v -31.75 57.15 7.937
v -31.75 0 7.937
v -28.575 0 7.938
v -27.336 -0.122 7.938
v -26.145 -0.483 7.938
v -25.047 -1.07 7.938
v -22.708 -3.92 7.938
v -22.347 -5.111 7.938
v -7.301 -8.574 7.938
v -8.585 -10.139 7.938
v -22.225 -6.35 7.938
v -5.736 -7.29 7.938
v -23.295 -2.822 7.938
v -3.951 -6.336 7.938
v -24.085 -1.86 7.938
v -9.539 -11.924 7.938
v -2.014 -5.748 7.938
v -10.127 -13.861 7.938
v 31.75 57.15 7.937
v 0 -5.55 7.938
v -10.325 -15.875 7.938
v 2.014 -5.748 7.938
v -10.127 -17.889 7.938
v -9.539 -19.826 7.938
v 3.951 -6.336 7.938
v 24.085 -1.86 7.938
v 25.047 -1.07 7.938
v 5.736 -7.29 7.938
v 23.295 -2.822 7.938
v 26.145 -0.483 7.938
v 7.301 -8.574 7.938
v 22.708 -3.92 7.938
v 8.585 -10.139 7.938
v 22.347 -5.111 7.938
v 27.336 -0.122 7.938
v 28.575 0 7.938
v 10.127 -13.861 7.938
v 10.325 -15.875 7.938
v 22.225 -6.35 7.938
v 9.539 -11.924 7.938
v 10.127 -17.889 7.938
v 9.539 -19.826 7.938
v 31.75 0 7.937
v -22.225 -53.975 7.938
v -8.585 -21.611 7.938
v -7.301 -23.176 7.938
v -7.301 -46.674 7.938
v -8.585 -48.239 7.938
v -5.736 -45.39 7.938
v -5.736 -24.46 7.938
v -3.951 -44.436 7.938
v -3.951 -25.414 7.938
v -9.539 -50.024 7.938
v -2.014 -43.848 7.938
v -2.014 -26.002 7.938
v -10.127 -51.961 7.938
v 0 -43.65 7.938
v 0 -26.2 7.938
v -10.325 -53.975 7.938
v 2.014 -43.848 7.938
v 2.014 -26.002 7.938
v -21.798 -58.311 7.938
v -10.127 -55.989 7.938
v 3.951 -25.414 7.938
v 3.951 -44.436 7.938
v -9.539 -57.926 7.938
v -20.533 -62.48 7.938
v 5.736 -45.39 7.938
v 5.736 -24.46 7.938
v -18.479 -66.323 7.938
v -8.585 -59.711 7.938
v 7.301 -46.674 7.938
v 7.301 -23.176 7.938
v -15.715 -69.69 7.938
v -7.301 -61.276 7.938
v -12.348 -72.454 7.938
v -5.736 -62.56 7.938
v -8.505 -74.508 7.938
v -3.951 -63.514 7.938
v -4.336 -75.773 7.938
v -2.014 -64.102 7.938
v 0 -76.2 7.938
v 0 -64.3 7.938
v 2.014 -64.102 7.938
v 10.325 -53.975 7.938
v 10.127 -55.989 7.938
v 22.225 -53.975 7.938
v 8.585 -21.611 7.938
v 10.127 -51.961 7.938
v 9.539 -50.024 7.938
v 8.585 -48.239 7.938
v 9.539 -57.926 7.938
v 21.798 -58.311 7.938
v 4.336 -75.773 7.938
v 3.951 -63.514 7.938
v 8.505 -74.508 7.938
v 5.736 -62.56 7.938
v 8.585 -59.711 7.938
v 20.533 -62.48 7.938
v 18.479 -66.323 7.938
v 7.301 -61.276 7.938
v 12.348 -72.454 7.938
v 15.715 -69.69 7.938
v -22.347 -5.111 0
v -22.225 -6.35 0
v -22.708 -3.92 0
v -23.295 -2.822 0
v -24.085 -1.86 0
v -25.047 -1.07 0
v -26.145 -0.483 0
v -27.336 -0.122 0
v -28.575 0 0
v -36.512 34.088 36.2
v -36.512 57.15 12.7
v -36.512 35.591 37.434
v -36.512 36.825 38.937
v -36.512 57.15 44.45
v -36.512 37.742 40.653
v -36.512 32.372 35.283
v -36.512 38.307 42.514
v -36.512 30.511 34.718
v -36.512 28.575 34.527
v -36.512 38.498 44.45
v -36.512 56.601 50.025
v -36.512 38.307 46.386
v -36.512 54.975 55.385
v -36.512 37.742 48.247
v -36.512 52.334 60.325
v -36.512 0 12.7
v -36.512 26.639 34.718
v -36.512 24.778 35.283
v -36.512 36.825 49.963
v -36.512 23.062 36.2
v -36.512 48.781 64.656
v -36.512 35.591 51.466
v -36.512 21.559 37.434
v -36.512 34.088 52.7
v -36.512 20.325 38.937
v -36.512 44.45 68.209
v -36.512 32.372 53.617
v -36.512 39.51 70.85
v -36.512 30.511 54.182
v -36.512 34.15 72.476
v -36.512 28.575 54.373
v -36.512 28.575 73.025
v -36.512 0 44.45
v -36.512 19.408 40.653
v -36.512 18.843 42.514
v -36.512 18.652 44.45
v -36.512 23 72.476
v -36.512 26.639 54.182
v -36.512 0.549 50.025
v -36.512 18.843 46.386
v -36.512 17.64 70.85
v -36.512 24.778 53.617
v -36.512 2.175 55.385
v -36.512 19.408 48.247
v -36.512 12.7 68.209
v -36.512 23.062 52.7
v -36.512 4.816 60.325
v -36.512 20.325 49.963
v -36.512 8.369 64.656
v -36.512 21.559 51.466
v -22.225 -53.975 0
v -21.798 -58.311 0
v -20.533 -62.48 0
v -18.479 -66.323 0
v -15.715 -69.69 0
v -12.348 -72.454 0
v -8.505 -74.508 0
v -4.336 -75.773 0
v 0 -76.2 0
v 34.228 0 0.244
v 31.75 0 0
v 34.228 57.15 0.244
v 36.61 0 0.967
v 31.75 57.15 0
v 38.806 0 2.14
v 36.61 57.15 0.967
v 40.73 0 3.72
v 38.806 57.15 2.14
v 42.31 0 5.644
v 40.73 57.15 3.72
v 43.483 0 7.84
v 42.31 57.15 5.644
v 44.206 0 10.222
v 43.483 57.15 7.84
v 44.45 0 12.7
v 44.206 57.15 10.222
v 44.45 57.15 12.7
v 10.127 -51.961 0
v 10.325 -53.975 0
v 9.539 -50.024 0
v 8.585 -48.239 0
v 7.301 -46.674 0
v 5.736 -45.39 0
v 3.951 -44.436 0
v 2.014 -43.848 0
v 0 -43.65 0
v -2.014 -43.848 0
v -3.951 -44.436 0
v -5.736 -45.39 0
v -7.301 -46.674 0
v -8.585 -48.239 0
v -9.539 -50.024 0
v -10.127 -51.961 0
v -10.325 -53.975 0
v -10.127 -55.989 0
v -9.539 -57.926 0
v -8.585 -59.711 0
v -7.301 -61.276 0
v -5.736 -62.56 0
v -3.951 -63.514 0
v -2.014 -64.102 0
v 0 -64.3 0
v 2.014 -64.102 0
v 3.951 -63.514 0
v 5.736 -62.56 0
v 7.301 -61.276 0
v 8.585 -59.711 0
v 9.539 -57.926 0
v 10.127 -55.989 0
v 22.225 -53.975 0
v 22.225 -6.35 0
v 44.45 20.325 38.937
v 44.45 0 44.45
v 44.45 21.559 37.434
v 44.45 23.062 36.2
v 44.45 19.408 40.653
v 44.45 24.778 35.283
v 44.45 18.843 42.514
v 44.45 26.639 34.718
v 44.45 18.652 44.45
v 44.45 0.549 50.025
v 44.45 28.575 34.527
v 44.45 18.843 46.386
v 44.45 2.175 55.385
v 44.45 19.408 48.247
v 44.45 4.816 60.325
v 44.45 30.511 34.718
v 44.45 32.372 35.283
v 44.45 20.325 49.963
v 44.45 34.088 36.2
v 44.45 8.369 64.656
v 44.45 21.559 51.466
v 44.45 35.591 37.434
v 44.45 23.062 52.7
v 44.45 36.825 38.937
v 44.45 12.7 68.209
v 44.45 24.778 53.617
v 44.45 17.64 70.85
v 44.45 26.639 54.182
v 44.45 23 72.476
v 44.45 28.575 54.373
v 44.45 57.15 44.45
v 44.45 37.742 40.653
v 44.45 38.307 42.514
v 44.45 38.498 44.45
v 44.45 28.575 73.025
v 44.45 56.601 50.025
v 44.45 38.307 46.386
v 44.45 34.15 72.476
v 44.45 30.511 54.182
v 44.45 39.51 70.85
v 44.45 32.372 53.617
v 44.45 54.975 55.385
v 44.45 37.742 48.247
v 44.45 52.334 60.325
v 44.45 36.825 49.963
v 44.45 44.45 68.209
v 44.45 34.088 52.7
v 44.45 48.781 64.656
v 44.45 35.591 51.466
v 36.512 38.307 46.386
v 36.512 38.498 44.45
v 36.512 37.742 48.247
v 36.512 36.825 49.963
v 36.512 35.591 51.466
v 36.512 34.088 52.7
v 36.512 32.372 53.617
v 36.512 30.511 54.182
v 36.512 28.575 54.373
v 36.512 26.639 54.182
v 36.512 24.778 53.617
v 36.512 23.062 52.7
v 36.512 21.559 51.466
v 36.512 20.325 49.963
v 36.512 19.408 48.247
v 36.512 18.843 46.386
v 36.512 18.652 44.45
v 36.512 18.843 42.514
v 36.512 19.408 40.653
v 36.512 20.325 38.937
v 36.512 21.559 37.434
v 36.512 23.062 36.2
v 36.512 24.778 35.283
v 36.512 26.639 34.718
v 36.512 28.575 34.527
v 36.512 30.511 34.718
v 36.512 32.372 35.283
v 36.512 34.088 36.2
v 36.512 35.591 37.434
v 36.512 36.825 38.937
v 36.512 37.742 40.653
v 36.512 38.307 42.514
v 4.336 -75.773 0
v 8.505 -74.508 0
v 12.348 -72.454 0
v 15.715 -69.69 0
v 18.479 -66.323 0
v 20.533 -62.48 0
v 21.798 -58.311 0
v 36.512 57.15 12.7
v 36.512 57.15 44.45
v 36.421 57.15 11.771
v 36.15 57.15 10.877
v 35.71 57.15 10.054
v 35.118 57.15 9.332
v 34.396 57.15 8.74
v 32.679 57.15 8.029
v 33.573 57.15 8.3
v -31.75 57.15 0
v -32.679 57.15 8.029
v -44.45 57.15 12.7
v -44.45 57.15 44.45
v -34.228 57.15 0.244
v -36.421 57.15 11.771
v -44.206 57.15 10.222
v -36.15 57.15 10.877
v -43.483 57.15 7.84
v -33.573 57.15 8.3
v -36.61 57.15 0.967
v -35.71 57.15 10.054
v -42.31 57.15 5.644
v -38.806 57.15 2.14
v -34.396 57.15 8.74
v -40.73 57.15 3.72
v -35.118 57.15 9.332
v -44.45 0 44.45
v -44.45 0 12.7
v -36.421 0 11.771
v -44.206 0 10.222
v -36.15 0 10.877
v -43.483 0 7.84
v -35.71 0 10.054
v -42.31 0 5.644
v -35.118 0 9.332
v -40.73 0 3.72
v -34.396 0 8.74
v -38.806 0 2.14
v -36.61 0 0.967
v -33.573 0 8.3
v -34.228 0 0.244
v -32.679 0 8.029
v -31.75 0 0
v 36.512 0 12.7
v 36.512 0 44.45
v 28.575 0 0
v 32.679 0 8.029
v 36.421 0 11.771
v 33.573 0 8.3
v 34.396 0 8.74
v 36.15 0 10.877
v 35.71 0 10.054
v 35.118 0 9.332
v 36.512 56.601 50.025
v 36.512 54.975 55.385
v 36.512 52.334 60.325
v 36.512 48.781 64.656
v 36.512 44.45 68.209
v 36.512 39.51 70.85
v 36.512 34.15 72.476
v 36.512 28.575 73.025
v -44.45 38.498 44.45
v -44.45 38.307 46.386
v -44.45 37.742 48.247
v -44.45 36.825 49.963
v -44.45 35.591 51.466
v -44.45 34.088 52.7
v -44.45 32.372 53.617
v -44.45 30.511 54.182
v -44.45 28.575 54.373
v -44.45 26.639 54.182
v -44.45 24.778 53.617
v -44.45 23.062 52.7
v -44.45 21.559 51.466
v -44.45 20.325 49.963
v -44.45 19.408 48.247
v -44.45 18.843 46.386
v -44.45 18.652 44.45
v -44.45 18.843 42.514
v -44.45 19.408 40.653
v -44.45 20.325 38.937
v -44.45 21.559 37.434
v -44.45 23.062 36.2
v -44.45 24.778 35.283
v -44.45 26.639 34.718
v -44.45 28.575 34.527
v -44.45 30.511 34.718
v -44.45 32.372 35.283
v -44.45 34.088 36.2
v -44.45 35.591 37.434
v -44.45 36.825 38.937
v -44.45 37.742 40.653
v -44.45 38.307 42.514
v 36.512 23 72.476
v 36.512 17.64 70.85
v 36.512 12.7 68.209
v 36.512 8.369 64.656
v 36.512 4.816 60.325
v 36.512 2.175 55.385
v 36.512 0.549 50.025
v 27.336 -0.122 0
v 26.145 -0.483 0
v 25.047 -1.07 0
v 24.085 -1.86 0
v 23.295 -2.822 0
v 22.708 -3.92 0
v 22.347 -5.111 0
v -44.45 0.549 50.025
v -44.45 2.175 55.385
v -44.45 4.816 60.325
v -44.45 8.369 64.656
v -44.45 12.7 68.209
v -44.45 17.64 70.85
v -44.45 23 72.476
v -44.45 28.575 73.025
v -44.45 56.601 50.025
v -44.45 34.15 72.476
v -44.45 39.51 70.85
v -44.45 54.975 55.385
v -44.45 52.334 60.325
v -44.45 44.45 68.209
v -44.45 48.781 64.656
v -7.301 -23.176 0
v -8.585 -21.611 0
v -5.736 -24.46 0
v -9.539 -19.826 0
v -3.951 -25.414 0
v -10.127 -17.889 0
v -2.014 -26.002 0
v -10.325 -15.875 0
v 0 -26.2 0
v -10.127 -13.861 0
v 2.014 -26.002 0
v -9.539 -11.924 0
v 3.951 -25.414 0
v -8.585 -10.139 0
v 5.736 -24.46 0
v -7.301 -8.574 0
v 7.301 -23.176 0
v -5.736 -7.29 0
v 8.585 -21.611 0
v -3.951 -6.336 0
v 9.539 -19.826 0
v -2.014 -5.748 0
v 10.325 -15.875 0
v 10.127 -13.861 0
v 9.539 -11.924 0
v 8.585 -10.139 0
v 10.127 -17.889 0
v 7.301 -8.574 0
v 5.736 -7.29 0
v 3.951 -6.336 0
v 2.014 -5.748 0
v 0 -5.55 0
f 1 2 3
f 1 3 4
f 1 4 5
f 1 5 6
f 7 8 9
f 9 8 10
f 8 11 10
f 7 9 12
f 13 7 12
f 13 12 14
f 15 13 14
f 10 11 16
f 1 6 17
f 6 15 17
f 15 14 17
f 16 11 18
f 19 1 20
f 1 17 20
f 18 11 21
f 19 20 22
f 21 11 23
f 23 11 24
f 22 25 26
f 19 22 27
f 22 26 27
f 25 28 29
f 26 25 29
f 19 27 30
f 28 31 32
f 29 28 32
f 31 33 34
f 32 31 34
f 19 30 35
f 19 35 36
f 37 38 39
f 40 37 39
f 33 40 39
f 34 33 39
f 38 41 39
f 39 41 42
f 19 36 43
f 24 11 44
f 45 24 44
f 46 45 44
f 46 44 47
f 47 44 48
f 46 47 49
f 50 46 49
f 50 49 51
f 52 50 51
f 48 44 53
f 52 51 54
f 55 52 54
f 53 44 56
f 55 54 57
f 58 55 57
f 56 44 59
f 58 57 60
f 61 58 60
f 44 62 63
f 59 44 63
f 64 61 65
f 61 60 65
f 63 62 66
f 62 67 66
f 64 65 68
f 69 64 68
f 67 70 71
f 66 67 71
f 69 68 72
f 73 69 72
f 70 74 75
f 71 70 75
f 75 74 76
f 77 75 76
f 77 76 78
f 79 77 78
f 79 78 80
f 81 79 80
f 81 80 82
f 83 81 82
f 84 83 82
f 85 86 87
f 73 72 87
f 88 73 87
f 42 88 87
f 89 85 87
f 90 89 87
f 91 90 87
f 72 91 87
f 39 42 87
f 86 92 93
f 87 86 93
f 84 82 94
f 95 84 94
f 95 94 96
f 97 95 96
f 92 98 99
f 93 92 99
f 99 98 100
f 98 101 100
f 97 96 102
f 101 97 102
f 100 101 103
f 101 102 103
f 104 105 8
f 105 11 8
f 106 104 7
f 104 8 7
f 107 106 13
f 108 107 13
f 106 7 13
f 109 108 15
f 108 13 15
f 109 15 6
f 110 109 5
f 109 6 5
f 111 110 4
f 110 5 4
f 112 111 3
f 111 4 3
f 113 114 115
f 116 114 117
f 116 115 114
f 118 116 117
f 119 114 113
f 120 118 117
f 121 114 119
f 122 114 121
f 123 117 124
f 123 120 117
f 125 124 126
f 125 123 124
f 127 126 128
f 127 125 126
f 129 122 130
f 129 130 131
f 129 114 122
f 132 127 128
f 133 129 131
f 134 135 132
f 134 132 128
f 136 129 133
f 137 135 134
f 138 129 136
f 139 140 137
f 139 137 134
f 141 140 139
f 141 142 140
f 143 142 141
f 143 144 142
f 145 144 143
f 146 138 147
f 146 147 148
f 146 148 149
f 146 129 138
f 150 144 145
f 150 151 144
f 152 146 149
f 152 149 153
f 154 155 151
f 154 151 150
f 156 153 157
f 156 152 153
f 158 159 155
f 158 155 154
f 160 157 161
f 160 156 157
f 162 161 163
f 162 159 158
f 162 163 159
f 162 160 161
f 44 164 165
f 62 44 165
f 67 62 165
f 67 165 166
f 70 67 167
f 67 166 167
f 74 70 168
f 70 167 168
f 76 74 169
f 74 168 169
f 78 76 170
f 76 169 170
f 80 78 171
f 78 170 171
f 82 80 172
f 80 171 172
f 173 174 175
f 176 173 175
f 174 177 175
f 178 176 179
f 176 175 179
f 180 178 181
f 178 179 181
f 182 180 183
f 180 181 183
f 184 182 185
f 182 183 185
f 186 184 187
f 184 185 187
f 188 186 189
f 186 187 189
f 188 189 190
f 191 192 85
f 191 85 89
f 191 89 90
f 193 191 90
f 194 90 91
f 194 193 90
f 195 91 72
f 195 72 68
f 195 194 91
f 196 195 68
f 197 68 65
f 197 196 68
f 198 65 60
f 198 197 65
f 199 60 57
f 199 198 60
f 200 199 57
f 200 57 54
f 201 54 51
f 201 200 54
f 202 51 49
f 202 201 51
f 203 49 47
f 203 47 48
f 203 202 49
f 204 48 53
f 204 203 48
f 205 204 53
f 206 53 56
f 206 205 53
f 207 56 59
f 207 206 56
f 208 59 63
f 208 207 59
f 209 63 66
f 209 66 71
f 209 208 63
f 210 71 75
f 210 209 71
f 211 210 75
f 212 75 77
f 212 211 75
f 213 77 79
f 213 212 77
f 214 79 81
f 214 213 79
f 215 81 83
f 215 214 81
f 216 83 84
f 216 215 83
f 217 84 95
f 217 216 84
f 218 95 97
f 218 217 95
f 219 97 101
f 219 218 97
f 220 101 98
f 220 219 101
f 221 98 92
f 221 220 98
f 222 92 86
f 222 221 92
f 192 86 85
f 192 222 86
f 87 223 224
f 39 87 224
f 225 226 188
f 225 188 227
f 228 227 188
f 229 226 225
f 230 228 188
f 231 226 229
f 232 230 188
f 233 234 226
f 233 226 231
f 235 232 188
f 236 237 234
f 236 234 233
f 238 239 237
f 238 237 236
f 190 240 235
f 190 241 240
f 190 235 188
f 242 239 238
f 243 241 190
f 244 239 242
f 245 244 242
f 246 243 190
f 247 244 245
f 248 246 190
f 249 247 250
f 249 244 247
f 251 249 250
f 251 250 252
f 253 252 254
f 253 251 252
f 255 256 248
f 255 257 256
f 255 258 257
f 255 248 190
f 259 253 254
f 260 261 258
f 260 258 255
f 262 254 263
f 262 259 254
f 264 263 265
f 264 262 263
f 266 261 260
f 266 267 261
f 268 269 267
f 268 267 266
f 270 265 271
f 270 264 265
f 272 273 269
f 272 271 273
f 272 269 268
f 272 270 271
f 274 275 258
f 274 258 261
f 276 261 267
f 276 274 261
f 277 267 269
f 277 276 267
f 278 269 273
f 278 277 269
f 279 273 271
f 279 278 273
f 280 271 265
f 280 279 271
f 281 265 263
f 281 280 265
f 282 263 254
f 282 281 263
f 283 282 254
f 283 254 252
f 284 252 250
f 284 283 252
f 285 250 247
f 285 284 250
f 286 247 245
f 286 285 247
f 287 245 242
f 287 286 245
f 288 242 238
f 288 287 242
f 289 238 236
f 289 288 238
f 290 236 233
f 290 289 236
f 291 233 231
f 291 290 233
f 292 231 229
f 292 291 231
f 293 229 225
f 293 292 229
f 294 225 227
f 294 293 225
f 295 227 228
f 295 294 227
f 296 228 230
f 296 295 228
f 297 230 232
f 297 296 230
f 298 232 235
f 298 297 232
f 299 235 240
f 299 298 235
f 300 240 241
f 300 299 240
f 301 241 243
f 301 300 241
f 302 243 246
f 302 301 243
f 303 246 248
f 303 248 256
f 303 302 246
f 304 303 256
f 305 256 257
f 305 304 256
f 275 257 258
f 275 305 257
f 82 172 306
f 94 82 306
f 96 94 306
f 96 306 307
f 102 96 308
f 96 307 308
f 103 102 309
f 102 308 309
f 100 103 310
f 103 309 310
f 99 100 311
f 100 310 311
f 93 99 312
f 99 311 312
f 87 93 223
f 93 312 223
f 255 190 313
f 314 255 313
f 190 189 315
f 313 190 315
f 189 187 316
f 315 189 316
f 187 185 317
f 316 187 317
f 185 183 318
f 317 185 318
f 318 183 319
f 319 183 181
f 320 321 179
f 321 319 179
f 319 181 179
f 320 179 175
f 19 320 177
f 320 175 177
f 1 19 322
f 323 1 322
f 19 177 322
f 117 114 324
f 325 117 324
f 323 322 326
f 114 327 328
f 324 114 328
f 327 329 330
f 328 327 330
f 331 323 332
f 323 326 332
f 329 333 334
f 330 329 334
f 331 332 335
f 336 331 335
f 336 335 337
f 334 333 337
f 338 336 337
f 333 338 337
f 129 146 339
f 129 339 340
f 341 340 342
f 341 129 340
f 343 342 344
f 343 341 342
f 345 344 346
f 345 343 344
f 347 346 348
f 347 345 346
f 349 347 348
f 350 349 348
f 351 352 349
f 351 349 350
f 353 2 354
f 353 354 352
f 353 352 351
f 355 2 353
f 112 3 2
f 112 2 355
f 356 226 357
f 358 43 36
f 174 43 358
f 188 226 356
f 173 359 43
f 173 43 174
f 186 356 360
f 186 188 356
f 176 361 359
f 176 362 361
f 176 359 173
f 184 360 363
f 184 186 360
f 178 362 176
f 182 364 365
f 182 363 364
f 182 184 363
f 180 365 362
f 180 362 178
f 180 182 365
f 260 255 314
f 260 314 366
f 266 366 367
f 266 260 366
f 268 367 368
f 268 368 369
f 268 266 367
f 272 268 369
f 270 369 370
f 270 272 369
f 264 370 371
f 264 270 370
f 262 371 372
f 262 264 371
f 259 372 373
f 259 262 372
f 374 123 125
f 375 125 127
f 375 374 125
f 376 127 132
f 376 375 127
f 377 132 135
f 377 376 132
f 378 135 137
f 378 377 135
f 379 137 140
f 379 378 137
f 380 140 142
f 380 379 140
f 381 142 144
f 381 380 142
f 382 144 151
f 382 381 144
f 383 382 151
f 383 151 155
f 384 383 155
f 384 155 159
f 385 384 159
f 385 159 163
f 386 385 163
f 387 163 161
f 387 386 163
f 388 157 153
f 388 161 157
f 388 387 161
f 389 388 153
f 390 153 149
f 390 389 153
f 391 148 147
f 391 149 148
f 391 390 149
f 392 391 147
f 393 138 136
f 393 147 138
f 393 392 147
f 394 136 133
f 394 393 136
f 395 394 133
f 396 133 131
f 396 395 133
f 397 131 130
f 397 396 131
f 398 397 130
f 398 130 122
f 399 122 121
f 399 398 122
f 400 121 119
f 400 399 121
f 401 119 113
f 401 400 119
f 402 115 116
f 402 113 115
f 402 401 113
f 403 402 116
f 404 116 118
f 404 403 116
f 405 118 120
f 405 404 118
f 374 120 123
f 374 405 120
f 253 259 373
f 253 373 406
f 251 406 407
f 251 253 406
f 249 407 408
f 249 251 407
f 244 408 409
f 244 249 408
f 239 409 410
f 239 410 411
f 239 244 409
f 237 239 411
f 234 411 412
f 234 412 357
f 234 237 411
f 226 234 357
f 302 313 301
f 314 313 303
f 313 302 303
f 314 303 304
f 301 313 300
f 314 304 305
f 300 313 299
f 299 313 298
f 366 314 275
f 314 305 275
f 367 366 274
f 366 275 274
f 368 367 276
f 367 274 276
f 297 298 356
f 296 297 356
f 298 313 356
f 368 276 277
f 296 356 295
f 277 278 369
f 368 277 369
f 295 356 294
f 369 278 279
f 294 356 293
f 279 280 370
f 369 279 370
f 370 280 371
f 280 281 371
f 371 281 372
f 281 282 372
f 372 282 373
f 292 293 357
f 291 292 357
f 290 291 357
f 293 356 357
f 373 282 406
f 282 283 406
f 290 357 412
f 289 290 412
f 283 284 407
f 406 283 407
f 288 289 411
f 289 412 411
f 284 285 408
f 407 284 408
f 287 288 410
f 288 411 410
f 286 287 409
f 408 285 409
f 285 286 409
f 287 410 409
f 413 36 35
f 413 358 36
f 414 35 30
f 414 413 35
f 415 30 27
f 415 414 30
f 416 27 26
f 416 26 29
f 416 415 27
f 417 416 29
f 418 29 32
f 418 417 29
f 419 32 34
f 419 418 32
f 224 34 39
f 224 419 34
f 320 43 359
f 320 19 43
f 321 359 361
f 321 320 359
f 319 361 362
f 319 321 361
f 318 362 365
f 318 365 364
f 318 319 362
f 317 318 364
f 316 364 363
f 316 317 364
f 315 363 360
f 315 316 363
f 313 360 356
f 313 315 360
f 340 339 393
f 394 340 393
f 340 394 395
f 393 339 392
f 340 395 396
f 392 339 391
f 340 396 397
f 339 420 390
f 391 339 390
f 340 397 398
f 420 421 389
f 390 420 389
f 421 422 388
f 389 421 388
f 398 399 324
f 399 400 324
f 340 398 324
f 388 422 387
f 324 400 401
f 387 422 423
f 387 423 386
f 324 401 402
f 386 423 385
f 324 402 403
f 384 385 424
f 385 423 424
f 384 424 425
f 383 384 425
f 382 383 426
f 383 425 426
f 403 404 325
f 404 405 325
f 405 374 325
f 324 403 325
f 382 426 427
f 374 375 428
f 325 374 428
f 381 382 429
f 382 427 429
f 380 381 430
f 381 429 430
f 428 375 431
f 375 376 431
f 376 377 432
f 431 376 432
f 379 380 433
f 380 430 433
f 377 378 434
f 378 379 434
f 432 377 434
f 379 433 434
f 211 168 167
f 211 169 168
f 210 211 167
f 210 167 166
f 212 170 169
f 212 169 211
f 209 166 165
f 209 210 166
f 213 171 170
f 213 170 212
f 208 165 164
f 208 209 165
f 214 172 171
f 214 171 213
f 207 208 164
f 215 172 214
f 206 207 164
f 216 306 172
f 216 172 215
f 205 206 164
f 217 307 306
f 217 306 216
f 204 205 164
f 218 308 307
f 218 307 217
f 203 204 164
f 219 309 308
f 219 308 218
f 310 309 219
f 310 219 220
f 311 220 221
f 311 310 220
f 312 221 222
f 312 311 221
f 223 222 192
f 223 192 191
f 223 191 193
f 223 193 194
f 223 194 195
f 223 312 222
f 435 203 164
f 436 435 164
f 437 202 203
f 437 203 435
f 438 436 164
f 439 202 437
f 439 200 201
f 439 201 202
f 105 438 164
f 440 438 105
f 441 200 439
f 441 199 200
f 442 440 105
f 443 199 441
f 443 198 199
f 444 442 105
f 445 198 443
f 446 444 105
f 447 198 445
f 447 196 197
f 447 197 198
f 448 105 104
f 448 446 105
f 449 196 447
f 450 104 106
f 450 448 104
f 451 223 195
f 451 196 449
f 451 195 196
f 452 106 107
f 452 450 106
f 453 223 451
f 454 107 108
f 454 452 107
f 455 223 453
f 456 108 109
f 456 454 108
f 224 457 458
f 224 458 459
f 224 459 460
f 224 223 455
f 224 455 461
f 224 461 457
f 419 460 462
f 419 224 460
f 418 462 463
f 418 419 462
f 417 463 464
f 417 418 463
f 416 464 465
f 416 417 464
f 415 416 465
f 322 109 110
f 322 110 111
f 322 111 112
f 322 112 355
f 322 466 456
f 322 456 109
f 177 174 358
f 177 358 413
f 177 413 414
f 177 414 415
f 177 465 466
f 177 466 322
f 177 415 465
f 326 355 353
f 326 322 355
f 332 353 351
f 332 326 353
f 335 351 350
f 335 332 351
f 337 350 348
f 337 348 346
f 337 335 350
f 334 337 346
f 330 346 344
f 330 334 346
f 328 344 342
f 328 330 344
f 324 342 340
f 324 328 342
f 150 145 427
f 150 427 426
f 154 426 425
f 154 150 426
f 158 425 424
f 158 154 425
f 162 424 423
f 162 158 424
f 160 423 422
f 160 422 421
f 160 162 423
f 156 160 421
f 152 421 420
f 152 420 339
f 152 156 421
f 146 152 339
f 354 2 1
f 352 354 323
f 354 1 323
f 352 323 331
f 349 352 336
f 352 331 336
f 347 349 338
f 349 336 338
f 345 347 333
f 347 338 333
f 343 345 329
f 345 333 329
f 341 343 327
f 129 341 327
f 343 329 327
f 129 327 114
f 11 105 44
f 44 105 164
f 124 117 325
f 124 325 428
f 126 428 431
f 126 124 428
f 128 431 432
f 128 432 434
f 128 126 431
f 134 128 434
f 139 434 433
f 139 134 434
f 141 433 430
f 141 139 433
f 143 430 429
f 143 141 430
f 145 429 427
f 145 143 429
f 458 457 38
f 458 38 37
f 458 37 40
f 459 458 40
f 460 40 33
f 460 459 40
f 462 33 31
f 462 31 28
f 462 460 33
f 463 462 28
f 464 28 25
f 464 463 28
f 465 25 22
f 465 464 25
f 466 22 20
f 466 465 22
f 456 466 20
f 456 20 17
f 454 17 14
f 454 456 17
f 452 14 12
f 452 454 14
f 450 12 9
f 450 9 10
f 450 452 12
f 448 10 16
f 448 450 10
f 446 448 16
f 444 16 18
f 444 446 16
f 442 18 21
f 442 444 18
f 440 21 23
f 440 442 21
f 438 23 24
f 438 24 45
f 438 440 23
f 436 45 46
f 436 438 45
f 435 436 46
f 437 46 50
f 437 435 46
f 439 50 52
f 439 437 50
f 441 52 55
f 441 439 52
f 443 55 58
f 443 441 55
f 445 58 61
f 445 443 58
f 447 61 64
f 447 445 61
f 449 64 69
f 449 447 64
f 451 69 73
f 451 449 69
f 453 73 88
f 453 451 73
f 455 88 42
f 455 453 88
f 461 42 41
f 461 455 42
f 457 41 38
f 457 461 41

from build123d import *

# Parameters (mm, degrees)
F0_R     = 9.92251
F1_DEPTH = 44.45
F2_R     = 10.3251
F3_DEPTH = 7.9375
F4_W     = 73.025
F4_H     = 76.2
F5_DEPTH = 57.151
F6_R     = 6.35
F7_R     = 4.7625
F8_R     = 12.7


with BuildPart() as f1:
    # F0 (on Right) → F1 (new body, symmetric)
    with BuildSketch(Plane.YZ):
        with BuildLine():
            Line((0, 44.45), (0, 0))
            Line((0, 0), (57.15, 0))
            Line((57.15, 0), (57.15, 44.45))
            ThreePointArc((57.15, 44.45), (48.7805762724, 64.6555762724), (28.575, 73.025))
            ThreePointArc((28.575, 73.025), (8.3694237276, 64.6555762724), (0, 44.45))
        make_face()
        with Locations((28.575, 44.45)):
            Circle(F0_R, mode=Mode.SUBTRACT)
    extrude(amount=F1_DEPTH, both=True)

    # F2 (on Top) → F3 (join)
    with BuildSketch(Plane.XY):
        with BuildLine():
            Line((22.225, 57.15), (-22.225, 57.15))
            Line((-22.225, 57.15), (-22.225, -53.975))
            ThreePointArc((-22.225, -53.975), (-15.7154482119, -69.6904482119), (0, -76.2))
            ThreePointArc((0, -76.2), (15.7154482119, -69.6904482119), (22.225, -53.975))
            Line((22.225, -53.975), (22.225, 57.15))
        make_face()
        with Locations((0, -53.975)):
            Circle(F2_R, mode=Mode.SUBTRACT)
        with Locations((0, -15.875)):
            Circle(F2_R, mode=Mode.SUBTRACT)
    extrude(amount=F3_DEPTH)

    # F4 (on Front) → F5 (cut, through all)
    with BuildSketch(Plane.XZ):
        with Locations((0, 46.0375)):
            Rectangle(F4_W, F4_H)
    extrude(amount=-F5_DEPTH, mode=Mode.SUBTRACT)

    # F6
    f6_edges = [f1.edges().sort_by_distance(p)[0] for p in [
        (-22.225, 0, 3.96875),
        (22.225, 0, 3.96875),
    ]]
    fillet(f6_edges, radius=F6_R)

    # F7
    f7_edges = [f1.edges().sort_by_distance(p)[0] for p in [
        (-36.5125, 28.575, 7.9375),
        (36.5125, 28.575, 7.9375),
    ]]
    fillet(f7_edges, radius=F7_R)

    # F8
    f8_edges = [f1.edges().sort_by_distance(p)[0] for p in [
        (-44.45, 28.575, 0),
        (44.45, 28.575, 0),
    ]]
    fillet(f8_edges, radius=F8_R)


solid = f1.part
